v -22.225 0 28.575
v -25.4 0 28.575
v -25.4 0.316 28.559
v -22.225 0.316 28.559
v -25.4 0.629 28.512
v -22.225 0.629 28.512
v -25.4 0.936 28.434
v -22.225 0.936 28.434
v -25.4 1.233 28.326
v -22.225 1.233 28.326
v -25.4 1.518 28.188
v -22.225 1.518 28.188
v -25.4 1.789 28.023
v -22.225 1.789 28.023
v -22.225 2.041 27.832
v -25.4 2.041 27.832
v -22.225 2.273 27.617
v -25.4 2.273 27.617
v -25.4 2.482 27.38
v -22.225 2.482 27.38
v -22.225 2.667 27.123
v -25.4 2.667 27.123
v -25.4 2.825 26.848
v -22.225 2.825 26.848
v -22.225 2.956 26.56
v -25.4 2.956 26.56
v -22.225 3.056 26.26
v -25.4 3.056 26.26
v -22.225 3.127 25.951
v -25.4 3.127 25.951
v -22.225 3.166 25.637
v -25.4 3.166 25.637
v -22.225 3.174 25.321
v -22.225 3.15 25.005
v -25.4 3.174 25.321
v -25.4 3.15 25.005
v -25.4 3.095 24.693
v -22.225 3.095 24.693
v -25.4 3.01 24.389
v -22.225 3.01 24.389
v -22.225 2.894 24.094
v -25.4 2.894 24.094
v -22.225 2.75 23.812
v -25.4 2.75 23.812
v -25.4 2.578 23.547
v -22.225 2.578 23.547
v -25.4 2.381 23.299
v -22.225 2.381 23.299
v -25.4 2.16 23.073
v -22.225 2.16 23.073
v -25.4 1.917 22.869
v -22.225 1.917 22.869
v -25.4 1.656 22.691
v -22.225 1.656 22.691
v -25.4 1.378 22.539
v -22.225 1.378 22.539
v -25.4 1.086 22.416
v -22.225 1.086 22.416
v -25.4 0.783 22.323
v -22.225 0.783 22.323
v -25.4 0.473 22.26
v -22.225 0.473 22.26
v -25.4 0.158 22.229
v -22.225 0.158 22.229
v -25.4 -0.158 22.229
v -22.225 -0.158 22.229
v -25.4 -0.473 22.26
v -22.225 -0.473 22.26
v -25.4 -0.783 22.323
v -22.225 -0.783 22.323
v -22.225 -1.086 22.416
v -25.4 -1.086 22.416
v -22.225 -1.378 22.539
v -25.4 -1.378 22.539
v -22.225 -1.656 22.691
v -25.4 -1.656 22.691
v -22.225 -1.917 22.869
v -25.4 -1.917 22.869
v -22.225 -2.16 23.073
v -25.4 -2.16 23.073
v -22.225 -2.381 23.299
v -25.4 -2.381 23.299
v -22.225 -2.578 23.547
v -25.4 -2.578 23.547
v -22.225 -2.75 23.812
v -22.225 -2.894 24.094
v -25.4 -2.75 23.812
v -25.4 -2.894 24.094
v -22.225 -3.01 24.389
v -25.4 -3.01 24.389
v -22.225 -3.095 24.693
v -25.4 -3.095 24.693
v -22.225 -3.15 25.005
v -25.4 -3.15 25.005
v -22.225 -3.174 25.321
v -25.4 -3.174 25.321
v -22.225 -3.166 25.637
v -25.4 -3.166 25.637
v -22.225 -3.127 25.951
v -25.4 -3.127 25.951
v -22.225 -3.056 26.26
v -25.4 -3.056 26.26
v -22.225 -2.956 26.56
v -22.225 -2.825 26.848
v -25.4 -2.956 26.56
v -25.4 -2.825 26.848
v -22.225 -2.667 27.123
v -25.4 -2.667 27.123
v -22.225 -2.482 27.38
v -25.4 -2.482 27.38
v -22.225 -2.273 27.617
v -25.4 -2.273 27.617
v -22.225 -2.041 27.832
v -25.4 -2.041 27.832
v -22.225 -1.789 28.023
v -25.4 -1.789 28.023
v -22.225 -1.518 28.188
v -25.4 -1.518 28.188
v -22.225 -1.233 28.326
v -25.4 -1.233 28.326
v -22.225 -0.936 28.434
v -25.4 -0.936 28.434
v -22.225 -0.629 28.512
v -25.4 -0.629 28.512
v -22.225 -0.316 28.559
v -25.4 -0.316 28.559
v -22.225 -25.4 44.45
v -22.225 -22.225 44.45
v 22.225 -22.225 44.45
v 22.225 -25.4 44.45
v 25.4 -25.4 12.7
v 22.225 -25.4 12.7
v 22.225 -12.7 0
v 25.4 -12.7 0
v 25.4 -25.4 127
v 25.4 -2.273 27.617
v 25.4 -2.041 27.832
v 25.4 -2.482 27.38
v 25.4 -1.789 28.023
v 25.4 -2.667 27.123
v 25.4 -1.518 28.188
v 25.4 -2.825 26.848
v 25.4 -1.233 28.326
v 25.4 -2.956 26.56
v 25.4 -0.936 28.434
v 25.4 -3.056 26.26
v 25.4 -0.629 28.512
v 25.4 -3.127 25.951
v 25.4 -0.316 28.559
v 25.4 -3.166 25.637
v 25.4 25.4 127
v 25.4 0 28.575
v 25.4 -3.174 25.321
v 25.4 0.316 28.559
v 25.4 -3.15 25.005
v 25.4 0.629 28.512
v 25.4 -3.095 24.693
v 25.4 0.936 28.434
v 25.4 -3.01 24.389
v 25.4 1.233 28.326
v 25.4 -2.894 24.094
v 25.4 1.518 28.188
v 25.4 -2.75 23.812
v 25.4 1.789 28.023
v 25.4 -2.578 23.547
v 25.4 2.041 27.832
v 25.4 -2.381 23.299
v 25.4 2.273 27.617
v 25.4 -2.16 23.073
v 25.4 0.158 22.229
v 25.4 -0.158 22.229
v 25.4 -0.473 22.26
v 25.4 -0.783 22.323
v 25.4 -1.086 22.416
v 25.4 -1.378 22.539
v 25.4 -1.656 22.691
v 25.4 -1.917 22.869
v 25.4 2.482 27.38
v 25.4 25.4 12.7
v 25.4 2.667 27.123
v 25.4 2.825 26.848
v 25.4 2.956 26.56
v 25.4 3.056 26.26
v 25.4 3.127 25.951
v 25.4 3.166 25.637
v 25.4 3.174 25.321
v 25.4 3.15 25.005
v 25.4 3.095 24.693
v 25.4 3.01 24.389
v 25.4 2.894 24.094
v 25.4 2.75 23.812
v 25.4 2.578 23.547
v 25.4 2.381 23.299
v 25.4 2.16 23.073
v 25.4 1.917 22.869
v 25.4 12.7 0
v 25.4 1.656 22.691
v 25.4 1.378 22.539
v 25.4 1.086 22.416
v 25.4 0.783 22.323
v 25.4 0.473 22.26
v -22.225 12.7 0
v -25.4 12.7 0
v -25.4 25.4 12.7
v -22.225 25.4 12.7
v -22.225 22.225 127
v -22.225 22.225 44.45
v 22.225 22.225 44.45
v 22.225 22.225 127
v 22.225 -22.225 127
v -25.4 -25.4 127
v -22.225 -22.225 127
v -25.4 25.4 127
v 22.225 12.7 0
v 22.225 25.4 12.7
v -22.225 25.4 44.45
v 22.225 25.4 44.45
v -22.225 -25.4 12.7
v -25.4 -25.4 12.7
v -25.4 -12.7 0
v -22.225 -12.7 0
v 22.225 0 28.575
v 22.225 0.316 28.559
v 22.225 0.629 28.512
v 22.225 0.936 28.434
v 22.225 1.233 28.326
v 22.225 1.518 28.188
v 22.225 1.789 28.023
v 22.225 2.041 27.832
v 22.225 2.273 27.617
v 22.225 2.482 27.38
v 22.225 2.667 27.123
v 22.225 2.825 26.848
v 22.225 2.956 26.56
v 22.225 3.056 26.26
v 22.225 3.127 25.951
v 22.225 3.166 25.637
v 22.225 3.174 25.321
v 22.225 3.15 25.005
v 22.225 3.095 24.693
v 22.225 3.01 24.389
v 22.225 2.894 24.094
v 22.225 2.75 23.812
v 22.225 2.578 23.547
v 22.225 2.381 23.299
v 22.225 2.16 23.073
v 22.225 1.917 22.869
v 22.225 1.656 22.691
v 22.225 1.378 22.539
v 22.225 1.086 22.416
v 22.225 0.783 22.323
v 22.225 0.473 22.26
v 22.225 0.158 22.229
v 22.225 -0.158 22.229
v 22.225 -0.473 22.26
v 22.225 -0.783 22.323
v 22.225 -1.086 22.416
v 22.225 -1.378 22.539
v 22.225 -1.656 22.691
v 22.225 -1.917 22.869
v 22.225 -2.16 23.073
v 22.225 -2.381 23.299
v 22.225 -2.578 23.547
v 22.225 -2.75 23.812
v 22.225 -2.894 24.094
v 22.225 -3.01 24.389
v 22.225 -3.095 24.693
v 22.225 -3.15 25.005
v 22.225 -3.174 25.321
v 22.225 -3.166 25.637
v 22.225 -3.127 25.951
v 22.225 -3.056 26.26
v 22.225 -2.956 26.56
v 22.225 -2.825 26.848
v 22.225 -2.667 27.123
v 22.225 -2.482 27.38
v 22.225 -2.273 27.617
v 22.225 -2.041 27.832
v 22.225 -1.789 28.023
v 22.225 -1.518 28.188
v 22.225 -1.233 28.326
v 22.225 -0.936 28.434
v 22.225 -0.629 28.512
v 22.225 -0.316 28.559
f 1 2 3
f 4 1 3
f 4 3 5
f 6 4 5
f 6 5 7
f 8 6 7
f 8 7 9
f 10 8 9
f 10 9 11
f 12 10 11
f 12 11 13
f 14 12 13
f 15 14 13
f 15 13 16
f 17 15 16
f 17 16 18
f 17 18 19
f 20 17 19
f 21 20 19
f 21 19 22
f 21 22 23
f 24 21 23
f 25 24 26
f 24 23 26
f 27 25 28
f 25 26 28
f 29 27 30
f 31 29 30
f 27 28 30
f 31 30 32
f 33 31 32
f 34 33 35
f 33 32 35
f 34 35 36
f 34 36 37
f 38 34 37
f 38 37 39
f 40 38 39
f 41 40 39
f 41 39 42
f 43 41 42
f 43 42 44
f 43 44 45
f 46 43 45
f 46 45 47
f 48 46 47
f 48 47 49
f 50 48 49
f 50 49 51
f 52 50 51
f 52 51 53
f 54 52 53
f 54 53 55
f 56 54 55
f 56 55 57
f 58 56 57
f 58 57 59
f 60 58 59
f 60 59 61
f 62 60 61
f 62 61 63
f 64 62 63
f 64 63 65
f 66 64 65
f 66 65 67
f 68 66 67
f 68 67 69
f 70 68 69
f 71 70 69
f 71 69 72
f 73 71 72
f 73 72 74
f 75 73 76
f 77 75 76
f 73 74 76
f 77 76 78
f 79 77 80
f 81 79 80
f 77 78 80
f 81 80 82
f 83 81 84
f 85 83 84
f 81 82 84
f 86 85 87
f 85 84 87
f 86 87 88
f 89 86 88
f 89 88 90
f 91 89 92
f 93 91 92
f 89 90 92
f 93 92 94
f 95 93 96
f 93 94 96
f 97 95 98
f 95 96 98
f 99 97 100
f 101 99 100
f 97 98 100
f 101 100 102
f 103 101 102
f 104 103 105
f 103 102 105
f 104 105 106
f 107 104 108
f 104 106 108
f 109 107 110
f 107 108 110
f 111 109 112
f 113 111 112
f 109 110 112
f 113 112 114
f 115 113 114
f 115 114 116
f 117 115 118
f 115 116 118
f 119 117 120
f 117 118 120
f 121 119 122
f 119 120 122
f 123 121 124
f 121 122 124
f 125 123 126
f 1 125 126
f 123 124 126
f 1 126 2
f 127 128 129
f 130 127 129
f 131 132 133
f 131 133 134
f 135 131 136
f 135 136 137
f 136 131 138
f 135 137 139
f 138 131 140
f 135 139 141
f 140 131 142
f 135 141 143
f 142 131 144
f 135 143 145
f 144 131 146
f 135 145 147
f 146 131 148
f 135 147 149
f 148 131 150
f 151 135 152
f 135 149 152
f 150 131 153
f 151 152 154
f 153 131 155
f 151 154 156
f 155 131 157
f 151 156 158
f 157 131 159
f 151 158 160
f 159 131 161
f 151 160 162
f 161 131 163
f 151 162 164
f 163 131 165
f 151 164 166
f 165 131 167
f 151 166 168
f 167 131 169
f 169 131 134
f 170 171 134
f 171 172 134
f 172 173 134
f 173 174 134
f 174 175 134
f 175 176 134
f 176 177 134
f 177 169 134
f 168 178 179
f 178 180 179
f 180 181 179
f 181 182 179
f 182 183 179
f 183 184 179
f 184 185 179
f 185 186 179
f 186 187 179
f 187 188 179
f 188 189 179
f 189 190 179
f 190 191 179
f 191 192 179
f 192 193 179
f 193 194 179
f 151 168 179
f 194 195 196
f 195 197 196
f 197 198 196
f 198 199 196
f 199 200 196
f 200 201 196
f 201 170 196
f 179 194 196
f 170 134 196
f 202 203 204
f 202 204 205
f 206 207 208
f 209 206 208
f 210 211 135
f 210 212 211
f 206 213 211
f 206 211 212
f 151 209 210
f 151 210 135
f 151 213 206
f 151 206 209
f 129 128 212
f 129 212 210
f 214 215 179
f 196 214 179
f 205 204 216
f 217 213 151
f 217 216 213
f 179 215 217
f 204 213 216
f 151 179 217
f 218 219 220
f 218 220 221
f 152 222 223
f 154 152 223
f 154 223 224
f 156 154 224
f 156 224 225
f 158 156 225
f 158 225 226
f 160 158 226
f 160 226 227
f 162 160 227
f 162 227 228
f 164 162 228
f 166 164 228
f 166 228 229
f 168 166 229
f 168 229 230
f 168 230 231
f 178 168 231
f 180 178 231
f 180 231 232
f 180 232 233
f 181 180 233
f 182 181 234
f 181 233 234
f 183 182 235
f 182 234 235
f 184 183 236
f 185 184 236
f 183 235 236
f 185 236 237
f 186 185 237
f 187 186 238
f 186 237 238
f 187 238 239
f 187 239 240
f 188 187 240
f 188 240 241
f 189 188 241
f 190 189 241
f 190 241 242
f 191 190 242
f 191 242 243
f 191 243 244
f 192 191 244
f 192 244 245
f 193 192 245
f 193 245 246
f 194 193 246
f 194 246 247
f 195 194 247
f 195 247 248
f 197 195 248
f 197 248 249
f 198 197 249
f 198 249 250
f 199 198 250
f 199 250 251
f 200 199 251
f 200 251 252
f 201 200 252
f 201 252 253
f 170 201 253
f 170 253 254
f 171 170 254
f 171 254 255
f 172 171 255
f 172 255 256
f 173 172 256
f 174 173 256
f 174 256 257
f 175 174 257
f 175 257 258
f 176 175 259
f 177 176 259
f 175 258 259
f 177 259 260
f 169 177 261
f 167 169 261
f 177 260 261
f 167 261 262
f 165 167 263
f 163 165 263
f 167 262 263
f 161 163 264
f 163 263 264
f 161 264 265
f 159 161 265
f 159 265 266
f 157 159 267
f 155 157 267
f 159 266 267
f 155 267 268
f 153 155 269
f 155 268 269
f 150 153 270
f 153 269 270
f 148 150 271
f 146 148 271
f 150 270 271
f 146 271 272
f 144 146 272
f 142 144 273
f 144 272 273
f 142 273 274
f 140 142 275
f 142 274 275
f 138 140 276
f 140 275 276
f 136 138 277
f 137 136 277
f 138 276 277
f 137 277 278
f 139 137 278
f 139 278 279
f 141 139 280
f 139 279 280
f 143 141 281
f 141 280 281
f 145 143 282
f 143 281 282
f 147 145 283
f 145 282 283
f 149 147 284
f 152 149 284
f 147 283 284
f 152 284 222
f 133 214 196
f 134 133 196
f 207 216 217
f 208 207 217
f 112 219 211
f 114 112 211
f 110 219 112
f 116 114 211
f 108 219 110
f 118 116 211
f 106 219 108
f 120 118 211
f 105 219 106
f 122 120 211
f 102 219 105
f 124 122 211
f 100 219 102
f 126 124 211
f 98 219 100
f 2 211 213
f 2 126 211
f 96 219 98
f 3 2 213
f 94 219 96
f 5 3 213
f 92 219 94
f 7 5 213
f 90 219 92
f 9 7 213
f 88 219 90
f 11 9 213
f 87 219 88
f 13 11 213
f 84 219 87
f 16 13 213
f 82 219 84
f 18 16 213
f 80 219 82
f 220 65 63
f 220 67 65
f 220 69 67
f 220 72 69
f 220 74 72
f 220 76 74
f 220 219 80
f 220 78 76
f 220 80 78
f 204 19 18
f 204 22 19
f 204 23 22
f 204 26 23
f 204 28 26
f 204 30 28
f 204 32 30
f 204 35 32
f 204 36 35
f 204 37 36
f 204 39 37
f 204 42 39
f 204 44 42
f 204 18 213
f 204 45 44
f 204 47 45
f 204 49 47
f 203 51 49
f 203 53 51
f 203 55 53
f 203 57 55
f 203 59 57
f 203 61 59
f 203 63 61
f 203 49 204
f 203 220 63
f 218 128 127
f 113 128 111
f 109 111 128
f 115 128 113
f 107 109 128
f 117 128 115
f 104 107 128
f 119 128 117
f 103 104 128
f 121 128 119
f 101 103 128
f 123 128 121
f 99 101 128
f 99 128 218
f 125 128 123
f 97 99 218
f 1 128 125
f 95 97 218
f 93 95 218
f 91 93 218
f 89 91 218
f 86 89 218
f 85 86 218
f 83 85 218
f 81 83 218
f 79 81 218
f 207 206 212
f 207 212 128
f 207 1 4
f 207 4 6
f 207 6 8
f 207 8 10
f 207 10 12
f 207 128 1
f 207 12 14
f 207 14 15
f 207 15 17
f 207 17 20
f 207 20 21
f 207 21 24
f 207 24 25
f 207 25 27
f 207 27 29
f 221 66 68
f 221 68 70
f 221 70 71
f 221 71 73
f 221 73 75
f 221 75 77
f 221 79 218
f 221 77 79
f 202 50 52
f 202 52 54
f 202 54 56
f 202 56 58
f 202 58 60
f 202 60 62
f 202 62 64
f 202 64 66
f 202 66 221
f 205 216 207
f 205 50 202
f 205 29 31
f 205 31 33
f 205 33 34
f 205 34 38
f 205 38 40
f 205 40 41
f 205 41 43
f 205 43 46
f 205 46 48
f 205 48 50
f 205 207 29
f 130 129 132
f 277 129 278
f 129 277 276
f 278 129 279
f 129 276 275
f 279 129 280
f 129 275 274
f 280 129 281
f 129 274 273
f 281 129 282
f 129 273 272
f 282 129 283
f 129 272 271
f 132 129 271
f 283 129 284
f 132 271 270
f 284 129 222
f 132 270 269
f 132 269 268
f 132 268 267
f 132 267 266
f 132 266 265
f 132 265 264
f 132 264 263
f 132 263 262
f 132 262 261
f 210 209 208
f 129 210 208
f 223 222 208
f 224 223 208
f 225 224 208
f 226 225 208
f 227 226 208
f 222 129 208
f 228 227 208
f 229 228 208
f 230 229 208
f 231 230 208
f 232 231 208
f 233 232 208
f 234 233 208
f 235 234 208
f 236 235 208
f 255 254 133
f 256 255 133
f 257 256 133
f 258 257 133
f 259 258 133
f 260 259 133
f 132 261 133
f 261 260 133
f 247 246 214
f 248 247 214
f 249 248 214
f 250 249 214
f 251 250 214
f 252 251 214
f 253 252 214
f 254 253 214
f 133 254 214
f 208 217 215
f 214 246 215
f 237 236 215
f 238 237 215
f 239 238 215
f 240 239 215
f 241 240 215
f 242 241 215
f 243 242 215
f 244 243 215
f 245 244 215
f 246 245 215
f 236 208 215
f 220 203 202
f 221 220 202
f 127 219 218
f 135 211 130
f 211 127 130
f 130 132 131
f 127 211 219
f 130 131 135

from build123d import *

# Parameters (mm, degrees)
SKETCH2_W           = 50.8
SKETCH2_H           = 50.8
SKETCH2_W_2         = 44.45
SKETCH2_H_2         = 44.45
BOSS_EXTRUDE1_DEPTH = 127
SKETCH3_R           = 3.175
CUT_EXTRUDE1_DEPTH  = 140.121529606
SKETCH5_W           = 44.45
SKETCH5_H           = 44.45
CUT_EXTRUDE2_DEPTH  = 140.121529606
CHAMFER1_SIZE       = 12.7


with BuildPart() as part:
    # Sketch2 → Boss-Extrude1 (new body)
    with BuildSketch(Plane.XY):
        Rectangle(SKETCH2_W, SKETCH2_H)
        Rectangle(SKETCH2_W_2, SKETCH2_H_2, mode=Mode.SUBTRACT)
    extrude(amount=BOSS_EXTRUDE1_DEPTH)

    # Sketch3 → Cut-Extrude1 (cut, through all)
    with BuildSketch(Plane.ZY.offset(25.4)):
        with Locations((25.4, 0)):
            Circle(SKETCH3_R)
    extrude(amount=-CUT_EXTRUDE1_DEPTH, mode=Mode.SUBTRACT)

    # Sketch5 → Cut-Extrude2 (cut, through all)
    with BuildSketch(Plane(origin=(0, 25.4, 0), x_dir=(1, 0, 0), z_dir=(0, 1, 0))):
        with Locations((0, -22.225)):
            Rectangle(SKETCH5_W, SKETCH5_H)
    extrude(amount=-CUT_EXTRUDE2_DEPTH, mode=Mode.SUBTRACT)

    # Chamfer1
    chamfer1_edges = [part.edges().sort_by_distance(p)[0] for p in [
        (23.8125, -25.4, 0),
        (-23.8125, 25.4, 0),
        (-23.8125, -25.4, 0),
        (23.8125, 25.4, 0),
    ]]
    chamfer(chamfer1_edges, length=CHAMFER1_SIZE)


solid = part.part
